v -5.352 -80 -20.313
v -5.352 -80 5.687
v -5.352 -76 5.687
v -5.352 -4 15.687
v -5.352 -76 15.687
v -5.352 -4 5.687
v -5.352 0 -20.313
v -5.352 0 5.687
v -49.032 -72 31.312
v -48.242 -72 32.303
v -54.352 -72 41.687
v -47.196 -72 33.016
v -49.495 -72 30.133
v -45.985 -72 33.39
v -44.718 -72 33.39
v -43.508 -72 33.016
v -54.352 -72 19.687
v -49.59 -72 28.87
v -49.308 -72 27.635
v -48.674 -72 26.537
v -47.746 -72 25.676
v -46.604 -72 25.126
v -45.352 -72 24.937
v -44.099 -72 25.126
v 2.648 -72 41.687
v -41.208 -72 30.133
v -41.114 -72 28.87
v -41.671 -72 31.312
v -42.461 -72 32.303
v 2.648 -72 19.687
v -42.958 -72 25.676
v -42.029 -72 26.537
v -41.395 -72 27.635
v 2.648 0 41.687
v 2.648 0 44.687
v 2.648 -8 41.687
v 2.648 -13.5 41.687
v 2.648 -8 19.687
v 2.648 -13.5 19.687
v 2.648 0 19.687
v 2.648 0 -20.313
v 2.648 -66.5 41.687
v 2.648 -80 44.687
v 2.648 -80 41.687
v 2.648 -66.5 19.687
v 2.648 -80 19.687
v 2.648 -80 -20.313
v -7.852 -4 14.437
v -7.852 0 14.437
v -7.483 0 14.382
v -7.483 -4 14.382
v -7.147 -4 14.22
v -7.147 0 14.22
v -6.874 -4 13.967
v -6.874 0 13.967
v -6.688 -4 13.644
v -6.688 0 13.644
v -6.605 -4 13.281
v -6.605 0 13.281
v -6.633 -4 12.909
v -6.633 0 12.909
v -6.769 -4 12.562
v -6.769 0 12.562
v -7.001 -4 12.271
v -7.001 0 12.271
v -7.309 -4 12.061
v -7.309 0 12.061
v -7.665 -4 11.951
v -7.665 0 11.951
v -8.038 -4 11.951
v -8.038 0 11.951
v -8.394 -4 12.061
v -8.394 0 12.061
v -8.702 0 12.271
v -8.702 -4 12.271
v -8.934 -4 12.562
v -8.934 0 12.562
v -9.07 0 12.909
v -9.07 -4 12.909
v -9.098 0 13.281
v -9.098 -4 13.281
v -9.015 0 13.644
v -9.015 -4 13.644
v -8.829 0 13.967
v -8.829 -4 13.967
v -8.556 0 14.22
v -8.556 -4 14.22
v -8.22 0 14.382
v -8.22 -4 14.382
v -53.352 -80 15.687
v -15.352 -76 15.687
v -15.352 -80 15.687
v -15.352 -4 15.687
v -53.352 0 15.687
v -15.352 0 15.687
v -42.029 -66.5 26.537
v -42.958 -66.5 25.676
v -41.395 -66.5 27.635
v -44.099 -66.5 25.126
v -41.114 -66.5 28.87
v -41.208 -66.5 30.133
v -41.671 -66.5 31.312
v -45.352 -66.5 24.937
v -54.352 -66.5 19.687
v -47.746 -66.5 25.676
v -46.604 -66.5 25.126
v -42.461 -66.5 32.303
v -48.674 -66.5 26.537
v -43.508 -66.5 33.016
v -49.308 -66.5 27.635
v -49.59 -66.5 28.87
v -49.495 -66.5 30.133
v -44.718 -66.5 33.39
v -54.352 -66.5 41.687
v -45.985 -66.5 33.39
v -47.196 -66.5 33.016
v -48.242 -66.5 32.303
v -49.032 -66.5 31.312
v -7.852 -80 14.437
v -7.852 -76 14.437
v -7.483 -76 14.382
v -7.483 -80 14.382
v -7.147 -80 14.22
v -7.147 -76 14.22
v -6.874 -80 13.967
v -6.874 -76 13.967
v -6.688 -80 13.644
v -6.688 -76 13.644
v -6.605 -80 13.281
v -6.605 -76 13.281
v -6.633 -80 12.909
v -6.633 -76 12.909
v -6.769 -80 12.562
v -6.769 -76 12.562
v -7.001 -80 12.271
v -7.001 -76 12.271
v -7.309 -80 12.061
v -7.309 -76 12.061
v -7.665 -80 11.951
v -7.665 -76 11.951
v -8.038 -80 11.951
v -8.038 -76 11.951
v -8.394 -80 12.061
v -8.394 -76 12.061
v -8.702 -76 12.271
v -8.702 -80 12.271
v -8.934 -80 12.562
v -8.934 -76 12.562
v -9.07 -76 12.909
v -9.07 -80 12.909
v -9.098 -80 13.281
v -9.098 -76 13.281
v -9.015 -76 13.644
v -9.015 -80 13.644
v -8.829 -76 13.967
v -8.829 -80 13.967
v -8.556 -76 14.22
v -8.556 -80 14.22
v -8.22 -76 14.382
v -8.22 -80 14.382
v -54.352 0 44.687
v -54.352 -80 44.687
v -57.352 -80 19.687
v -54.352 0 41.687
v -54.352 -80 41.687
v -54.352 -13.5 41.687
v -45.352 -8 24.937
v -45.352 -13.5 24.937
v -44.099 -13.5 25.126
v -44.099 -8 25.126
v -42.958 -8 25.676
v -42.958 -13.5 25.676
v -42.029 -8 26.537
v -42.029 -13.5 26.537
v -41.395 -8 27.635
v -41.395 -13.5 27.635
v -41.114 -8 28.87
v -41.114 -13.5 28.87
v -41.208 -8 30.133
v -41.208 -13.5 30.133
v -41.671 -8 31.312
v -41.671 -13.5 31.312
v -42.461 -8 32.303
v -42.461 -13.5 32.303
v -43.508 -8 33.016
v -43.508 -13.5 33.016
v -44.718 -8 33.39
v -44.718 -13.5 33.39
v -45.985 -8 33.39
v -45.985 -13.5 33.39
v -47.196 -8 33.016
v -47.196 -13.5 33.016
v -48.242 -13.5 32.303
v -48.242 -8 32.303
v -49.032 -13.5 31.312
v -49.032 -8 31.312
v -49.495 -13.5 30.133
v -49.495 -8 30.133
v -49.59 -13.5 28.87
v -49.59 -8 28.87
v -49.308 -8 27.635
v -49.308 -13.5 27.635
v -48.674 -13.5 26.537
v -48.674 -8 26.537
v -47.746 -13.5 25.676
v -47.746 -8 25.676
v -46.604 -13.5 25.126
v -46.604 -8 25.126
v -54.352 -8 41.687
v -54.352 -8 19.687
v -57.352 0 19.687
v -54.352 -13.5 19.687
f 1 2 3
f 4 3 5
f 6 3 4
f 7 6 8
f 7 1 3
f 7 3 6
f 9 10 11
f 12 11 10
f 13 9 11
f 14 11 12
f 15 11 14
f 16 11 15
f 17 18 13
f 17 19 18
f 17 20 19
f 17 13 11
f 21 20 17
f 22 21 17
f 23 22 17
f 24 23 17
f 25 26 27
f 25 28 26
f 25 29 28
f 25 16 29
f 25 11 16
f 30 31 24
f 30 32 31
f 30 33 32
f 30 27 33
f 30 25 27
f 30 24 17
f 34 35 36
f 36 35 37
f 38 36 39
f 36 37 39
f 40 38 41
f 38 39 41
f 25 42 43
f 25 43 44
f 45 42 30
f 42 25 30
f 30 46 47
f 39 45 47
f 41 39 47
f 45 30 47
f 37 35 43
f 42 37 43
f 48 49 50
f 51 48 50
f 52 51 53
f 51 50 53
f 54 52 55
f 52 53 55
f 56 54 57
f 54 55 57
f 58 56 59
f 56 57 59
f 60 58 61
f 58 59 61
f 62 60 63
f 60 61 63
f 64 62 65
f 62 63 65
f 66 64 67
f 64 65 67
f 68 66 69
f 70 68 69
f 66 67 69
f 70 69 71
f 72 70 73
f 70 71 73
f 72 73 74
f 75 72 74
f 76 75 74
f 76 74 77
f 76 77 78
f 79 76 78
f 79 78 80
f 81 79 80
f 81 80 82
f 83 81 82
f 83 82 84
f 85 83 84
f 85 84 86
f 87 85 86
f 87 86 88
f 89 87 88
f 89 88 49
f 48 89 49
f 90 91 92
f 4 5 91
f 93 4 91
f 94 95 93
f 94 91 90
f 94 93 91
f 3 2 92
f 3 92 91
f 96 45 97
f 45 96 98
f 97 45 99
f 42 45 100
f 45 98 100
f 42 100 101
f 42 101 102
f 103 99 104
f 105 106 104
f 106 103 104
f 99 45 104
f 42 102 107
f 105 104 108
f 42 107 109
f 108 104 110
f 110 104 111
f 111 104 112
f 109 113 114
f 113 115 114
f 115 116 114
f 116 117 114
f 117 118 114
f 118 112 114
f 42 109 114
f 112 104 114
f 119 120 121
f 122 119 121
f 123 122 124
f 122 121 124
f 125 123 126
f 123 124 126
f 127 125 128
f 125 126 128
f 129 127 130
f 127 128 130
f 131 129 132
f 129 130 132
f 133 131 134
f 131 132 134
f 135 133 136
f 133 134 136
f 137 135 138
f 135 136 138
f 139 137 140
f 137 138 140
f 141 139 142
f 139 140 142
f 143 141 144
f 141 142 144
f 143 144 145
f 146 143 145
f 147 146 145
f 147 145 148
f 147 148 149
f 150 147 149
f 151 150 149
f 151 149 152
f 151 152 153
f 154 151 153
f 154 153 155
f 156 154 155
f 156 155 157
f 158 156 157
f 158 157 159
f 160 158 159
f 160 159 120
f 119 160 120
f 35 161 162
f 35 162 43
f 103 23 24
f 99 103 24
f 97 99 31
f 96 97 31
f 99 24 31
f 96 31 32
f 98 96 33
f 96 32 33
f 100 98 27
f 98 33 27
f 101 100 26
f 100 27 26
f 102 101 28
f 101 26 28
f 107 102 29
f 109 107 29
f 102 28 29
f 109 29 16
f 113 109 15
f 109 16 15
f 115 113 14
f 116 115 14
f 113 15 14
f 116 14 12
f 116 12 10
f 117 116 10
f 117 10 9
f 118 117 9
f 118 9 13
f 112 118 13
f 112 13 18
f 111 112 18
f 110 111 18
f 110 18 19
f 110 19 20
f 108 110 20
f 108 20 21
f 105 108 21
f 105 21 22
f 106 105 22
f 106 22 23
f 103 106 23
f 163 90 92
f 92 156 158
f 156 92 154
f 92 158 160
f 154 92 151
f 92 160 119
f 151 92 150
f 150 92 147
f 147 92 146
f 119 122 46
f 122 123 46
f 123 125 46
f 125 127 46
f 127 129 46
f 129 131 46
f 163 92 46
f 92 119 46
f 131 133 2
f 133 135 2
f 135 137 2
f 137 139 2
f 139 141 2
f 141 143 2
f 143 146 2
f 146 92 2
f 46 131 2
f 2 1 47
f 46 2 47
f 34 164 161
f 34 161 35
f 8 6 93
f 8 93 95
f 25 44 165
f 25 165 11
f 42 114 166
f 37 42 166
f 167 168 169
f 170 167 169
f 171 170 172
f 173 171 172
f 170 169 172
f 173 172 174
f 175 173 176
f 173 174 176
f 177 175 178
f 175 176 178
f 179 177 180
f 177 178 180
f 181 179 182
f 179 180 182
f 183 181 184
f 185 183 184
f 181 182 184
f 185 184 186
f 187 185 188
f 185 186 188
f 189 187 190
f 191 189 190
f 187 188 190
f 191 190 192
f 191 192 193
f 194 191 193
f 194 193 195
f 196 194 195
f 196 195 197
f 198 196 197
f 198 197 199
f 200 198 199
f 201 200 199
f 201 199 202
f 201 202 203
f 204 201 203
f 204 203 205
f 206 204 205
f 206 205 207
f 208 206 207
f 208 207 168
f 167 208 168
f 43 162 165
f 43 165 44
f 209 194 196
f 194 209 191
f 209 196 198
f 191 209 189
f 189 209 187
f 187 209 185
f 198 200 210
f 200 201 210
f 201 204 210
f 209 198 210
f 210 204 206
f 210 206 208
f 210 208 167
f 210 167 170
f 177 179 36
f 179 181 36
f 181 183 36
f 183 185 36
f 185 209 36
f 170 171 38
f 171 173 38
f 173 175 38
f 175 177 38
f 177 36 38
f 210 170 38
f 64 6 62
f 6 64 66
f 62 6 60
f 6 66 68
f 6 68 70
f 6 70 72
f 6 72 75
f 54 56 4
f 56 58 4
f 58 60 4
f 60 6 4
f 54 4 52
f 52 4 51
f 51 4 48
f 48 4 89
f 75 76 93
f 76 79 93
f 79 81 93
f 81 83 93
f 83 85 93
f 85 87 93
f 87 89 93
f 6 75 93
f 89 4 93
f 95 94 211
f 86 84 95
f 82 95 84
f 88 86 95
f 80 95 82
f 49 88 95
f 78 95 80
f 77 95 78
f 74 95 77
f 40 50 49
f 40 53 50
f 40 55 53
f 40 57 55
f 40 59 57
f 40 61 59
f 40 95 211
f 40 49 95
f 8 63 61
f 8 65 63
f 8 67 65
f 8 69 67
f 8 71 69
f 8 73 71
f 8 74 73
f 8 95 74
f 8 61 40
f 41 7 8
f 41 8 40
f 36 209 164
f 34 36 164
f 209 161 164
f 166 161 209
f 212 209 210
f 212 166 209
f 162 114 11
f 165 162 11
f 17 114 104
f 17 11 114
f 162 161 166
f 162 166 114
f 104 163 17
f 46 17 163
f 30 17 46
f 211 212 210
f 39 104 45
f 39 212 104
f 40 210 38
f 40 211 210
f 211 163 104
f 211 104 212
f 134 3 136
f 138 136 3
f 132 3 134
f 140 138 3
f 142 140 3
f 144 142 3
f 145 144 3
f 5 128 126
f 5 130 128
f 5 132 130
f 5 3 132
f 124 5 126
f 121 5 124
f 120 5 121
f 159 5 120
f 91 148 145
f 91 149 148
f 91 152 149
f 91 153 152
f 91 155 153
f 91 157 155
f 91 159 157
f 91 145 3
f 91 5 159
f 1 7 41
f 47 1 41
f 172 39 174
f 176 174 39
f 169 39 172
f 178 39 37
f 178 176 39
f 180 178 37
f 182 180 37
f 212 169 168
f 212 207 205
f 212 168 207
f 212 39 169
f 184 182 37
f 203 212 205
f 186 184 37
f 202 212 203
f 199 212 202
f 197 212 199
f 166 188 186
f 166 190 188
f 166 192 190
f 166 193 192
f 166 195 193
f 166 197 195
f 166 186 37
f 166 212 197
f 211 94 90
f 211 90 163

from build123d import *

# Parameters (mm, degrees)
SKETCH1_W           = 20
SKETCH1_H           = 40
BOSS_EXTRUDE1_DEPTH = 80
SKETCH8_W           = 25
SKETCH8_H           = 64
BOSS_EXTRUDE2_DEPTH = 57
SKETCH12_W          = 57
SKETCH12_H          = 6
BOSS_EXTRUDE3_DEPTH = 8
SKETCH14_W          = 57
SKETCH14_H          = 6
BOSS_EXTRUDE4_DEPTH = 8
SKETCH17_W          = 48
SKETCH17_H          = 80
CUT_EXTRUDE4_DEPTH  = 36
CHAMFER1_SIZE       = 10
SKETCH16_W          = 48
SKETCH16_H          = 72
CUT_EXTRUDE5_DEPTH  = 10
SKETCH19_R          = 1.25
CUT_EXTRUDE6_DEPTH  = 109.102562738
SKETCH21_W          = 19
SKETCH21_H          = 53
CUT_EXTRUDE7_DEPTH  = 108.916413596
SKETCH22_R          = 4.25
CUT_EXTRUDE8_DEPTH  = 103.323819663
SKETCH25_W          = 3
SKETCH25_H          = 8
SKETCH25_H_2        = 53
CUT_EXTRUDE11_DEPTH = 108.916413596


with BuildPart() as part:
    # Sketch1 → Boss-Extrude1 (new body)
    with BuildSketch(Plane(origin=(0, 0, 0), x_dir=(1, 0, 0), z_dir=(0, 1, 0))):
        Polygon((-17.351649908, 20.312727502), (-57.351649908, -19.687272498), (-17.351649908, -19.687272498), align=None)
        with Locations((-7.351649908, 0.312727502)):
            Rectangle(SKETCH1_W, SKETCH1_H)
    extrude(amount=-BOSS_EXTRUDE1_DEPTH)

    # Sketch8 → Boss-Extrude2 (add)
    with BuildSketch(Plane(origin=(2.648350092, 0, 0), x_dir=(0, 0, -1), z_dir=(1, 0, 0))):
        with Locations((-32.187272498, -40)):
            Rectangle(SKETCH8_W, SKETCH8_H)
    extrude(amount=-BOSS_EXTRUDE2_DEPTH)

    # Sketch12 → Boss-Extrude3 (add)
    with BuildSketch(Plane.XZ.offset(72)):
        with Locations((-25.851649908, 41.687272498)):
            Rectangle(SKETCH12_W, SKETCH12_H)
    extrude(amount=BOSS_EXTRUDE3_DEPTH)

    # Sketch14 → Boss-Extrude4 (add)
    with BuildSketch(Plane(origin=(0, -8, 0), x_dir=(1, 0, 0), z_dir=(0, 1, 0))):
        with Locations((-25.851649908, -41.687272498)):
            Rectangle(SKETCH14_W, SKETCH14_H)
    extrude(amount=BOSS_EXTRUDE4_DEPTH)

    # Sketch17 → Cut-Extrude4 (cut)
    with BuildSketch(Plane(origin=(0, 0, -20.312727502), x_dir=(-1, 0, 0), z_dir=(0, 0, -1))):
        with Locations((29.351649908, -40)):
            Rectangle(SKETCH17_W, SKETCH17_H)
    extrude(amount=-CUT_EXTRUDE4_DEPTH, mode=Mode.SUBTRACT)

    # Chamfer1
    chamfer1_edges = [part.edges().sort_by_distance(p)[0] for p in [
        (-5.351649908, -40, 15.687272498),
    ]]
    chamfer(chamfer1_edges, length=CHAMFER1_SIZE)

    # Sketch16 → Cut-Extrude5 (cut)
    with BuildSketch(Plane(origin=(0, 0, 15.687272498), x_dir=(-1, 0, 0), z_dir=(0, 0, -1))):
        with Locations((29.351649908, -40)):
            Rectangle(SKETCH16_W, SKETCH16_H)
    extrude(amount=CUT_EXTRUDE5_DEPTH, mode=Mode.SUBTRACT)

    # Sketch19 → Cut-Extrude6 (cut, through all)
    with BuildSketch(Plane(origin=(0, 0, 0), x_dir=(1, 0, 0), z_dir=(0, 1, 0))):
        with Locations(Location((-7.851649908, -13.187272498, 0), (0, 0, 270))):
            Circle(SKETCH19_R)
    extrude(amount=-CUT_EXTRUDE6_DEPTH, mode=Mode.SUBTRACT)

    # Sketch21 → Cut-Extrude7 (cut, through all)
    with BuildSketch(Plane.ZY.offset(54.351649908)):
        with Locations((29.187272498, -40)):
            Rectangle(SKETCH21_W, SKETCH21_H)
    extrude(amount=-CUT_EXTRUDE7_DEPTH, mode=Mode.SUBTRACT)

    # Sketch22 → Cut-Extrude8 (cut, through all)
    with BuildSketch(Plane.XZ.offset(72)):
        with Locations(Location((-45.351649908, 29.187272498, 0), (0, 0, 270))):
            Circle(SKETCH22_R)
    extrude(amount=-CUT_EXTRUDE8_DEPTH, mode=Mode.SUBTRACT)

    # Sketch25 → Cut-Extrude11 (cut, through all)
    with BuildSketch(Plane.ZY.offset(54.351649908)):
        with Locations((40.187272498, -76)):
            Rectangle(SKETCH25_W, SKETCH25_H)
        with Locations((40.187272498, -40)):
            Rectangle(SKETCH25_W, SKETCH25_H_2)
        with Locations((40.187272498, -4)):
            Rectangle(SKETCH25_W, SKETCH25_H)
    extrude(amount=-CUT_EXTRUDE11_DEPTH, mode=Mode.SUBTRACT)


solid = part.part
